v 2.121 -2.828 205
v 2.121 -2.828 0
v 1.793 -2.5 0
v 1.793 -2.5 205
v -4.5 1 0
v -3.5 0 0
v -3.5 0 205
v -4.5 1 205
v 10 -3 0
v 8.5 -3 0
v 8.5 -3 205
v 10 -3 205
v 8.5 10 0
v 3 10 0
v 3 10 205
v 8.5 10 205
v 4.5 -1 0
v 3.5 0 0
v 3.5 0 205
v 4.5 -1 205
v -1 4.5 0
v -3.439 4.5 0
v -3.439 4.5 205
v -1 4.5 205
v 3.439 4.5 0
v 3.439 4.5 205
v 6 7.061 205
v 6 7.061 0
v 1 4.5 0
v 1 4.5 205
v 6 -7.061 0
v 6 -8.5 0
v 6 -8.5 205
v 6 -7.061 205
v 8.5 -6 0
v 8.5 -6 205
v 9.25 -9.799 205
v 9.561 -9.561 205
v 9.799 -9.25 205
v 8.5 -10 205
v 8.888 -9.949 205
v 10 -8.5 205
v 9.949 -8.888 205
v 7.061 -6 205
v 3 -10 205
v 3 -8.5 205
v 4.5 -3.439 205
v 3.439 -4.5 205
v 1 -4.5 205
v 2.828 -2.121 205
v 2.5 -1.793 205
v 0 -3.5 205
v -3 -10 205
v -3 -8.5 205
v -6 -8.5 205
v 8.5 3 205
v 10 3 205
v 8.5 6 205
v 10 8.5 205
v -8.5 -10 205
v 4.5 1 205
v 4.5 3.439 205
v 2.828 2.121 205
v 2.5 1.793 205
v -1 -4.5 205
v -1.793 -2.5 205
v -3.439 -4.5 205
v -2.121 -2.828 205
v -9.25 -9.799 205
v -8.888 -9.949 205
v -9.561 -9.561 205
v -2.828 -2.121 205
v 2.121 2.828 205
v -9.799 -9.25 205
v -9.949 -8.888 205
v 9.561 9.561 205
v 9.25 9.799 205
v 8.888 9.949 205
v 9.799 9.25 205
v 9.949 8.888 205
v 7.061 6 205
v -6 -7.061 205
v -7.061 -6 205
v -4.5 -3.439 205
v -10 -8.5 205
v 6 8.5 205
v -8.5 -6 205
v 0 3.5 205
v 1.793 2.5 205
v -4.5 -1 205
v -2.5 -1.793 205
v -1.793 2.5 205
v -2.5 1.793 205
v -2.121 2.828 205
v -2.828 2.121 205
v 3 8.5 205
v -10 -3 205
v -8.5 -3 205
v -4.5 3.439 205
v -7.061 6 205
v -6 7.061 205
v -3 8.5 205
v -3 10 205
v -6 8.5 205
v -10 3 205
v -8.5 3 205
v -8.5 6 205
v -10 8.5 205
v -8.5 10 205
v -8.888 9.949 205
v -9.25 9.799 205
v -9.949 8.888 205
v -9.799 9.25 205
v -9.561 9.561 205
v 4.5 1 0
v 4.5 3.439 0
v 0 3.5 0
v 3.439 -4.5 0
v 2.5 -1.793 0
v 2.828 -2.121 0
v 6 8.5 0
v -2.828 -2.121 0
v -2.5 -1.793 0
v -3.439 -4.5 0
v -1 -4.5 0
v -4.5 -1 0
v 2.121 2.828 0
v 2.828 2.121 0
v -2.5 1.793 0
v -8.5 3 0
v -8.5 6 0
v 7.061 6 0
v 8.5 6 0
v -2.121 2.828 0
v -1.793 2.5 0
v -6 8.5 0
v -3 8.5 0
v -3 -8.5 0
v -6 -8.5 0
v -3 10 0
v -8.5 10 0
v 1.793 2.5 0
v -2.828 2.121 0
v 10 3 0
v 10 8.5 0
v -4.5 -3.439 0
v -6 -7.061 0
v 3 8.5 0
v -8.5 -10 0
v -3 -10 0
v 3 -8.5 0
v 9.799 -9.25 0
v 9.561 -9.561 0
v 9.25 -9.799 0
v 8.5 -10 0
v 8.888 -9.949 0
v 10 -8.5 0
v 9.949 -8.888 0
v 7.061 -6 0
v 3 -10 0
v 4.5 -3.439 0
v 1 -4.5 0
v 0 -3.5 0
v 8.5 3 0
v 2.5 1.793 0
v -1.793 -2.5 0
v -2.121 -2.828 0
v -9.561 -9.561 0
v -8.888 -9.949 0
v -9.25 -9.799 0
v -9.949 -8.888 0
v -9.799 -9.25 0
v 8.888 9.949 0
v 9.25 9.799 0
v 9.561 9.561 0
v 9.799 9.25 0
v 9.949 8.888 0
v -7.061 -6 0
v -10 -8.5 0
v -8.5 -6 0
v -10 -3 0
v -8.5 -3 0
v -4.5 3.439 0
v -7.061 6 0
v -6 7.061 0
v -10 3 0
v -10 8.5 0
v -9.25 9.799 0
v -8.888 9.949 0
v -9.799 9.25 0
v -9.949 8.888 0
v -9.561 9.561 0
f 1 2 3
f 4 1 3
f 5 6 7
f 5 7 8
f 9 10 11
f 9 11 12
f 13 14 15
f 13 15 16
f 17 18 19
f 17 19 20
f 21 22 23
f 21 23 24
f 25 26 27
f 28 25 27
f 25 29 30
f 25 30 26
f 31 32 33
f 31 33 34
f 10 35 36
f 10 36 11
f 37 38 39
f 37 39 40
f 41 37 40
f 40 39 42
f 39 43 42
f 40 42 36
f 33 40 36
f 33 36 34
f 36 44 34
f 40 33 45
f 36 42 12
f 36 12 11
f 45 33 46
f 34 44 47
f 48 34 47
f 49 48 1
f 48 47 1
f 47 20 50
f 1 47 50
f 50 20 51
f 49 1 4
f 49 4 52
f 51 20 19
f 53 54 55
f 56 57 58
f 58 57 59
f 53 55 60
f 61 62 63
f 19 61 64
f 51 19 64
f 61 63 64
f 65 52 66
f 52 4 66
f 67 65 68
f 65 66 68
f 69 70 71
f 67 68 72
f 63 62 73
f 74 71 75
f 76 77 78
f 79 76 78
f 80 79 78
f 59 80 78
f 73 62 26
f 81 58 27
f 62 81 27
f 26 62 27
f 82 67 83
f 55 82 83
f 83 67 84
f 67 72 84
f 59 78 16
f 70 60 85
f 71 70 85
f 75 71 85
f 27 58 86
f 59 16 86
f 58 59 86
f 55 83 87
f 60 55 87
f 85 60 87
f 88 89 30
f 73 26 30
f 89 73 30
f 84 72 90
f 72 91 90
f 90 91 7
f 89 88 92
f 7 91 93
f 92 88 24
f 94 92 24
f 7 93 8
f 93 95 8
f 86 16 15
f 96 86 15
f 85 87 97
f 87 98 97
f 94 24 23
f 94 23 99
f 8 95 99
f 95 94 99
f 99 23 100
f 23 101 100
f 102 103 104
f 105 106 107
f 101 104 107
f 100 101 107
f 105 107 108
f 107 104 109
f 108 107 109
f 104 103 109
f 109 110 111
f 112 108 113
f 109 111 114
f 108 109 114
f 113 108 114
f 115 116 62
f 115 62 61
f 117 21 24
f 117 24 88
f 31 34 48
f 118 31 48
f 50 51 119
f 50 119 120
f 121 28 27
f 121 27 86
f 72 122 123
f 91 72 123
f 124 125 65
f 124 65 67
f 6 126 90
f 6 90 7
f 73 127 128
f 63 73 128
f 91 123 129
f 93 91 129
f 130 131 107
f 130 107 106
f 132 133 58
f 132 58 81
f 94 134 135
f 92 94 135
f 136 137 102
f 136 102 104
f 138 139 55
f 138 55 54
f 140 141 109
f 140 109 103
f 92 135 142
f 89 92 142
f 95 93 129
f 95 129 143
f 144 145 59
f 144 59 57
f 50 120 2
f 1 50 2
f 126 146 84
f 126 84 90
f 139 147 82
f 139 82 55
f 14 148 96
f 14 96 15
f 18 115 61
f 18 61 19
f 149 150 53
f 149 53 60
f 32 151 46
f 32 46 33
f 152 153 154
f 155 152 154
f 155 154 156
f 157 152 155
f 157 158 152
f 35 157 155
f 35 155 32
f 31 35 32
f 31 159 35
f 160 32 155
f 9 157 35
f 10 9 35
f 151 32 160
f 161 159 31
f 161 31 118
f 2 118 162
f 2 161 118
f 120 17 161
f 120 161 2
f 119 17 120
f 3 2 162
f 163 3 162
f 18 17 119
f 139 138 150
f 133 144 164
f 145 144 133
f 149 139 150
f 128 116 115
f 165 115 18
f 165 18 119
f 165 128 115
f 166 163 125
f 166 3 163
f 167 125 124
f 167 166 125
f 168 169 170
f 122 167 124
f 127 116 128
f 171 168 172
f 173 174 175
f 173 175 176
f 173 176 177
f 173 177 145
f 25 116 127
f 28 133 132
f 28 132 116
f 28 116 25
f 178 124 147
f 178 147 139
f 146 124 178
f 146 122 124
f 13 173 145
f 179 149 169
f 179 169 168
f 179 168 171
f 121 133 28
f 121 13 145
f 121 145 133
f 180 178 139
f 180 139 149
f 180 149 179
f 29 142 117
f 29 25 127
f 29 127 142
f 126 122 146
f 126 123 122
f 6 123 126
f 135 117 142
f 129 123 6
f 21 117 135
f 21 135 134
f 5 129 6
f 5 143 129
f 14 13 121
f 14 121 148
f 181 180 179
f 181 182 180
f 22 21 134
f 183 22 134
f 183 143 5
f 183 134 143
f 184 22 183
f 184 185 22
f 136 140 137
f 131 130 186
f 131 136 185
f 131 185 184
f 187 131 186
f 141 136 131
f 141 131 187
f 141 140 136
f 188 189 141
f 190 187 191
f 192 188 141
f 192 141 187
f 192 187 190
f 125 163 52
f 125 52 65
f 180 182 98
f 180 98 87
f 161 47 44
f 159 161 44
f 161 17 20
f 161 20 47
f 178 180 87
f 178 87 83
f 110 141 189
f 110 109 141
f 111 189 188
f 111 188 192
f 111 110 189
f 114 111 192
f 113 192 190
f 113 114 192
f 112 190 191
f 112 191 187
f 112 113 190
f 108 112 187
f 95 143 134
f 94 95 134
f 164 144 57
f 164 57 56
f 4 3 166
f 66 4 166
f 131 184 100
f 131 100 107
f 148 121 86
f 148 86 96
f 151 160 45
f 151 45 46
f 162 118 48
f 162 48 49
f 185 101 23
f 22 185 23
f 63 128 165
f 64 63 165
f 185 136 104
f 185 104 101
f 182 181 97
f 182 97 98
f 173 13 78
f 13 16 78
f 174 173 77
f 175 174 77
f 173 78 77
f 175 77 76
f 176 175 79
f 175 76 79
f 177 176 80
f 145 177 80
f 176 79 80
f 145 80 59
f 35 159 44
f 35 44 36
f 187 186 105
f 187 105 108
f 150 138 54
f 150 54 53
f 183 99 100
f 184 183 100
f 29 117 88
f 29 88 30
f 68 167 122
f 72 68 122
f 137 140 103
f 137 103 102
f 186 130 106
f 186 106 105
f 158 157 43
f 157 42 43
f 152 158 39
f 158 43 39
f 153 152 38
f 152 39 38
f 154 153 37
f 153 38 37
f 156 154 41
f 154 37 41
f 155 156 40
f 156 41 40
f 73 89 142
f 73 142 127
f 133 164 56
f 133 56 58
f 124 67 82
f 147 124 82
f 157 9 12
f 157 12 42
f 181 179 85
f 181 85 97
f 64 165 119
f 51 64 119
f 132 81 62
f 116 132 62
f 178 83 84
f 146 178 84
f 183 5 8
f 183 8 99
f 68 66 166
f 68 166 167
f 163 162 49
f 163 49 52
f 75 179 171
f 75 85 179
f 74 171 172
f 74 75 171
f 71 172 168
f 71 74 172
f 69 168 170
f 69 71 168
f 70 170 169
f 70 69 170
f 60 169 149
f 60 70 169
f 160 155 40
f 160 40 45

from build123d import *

# Parameters (mm, degrees)
BOSS_EXTRUDE1_DEPTH = 205
FILLET1_R           = 1.5


with BuildPart() as part:
    # Sketch1 → Boss-Extrude1 (new body)
    with BuildSketch(Plane.XY):
        Polygon((0, 3.5), (1, 4.5), (3.439339828, 4.5), (6, 7.060660172), (6, 8.5), (3, 8.5), (3, 10), (10, 10), (10, 3), (8.5, 3), (8.5, 6), (7.060660172, 6), (4.5, 3.439339828), (4.5, 1), (3.5, 0), (4.5, -1), (4.5, -3.439339828), (7.060660172, -6), (8.5, -6), (8.5, -3), (10, -3), (10, -10), (3, -10), (3, -8.5), (6, -8.5), (6, -7.060660172), (3.439339828, -4.5), (1, -4.5), (0, -3.5), (-1, -4.5), (-3.439339828, -4.5), (-6, -7.060660172), (-6, -8.5), (-3, -8.5), (-3, -10), (-10, -10), (-10, -3), (-8.5, -3), (-8.5, -6), (-7.060660172, -6), (-4.5, -3.439339828), (-4.5, -1), (-3.5, 0), (-4.5, 1), (-4.5, 3.439339828), (-7.060660172, 6), (-8.5, 6), (-8.5, 3), (-10, 3), (-10, 10), (-3, 10), (-3, 8.5), (-6, 8.5), (-6, 7.060660172), (-3.439339828, 4.5), (-1, 4.5), align=None)
        Polygon((-1.792893219, 2.5), (1.792893219, 2.5), (2.121320344, 2.828427125), (2.828427125, 2.121320344), (2.5, 1.792893219), (2.5, -1.792893219), (2.828427125, -2.121320344), (2.121320344, -2.828427125), (1.792893219, -2.5), (-1.792893219, -2.5), (-2.121320344, -2.828427125), (-2.828427125, -2.121320344), (-2.5, -1.792893219), (-2.5, 1.792893219), (-2.828427125, 2.121320344), (-2.121320344, 2.828427125), align=None, mode=Mode.SUBTRACT)
    extrude(amount=BOSS_EXTRUDE1_DEPTH)

    # Fillet1
    fillet1_edges = [part.edges().sort_by_distance(p)[0] for p in [
        (10, 10, 102.5),
        (10, -10, 102.5),
        (-10, -10, 102.5),
        (-10, 10, 102.5),
    ]]
    fillet(fillet1_edges, radius=FILLET1_R)


solid = part.part
